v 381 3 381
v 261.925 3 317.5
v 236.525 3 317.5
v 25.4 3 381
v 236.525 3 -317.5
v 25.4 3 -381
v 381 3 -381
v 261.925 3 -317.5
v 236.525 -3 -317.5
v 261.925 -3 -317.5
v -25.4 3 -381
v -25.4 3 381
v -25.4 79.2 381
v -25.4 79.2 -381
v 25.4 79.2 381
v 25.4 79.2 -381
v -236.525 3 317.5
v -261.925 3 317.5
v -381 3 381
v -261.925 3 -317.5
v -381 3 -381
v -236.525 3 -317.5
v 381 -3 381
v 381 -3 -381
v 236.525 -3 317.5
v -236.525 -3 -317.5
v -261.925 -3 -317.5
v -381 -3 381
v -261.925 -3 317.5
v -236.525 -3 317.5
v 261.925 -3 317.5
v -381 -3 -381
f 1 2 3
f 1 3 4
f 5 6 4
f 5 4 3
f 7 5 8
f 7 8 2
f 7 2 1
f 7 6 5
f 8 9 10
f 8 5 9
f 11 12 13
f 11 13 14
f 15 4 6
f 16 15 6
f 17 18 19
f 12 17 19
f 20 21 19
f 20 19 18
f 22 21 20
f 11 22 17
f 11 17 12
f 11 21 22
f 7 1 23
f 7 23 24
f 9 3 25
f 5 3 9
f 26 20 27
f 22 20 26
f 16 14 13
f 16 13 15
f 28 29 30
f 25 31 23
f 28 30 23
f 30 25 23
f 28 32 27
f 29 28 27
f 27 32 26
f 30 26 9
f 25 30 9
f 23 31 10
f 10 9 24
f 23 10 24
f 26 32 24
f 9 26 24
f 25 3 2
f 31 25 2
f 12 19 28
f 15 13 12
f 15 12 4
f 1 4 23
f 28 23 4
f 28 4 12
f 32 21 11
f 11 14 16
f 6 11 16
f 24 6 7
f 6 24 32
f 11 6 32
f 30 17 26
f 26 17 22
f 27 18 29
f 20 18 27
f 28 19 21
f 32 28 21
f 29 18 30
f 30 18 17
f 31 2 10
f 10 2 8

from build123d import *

# Parameters (mm, degrees)
SKETCH1_W           = 762
SKETCH1_H           = 762
SKETCH1_W_2         = 25.4
SKETCH1_H_2         = 635
BOSS_EXTRUDE1_DEPTH = 3
SKETCH2_W           = 50.8
SKETCH2_H           = 762
BOSS_EXTRUDE2_DEPTH = 76.2


with BuildPart() as part:
    # Sketch1 → Boss-Extrude1 (new, symmetric)
    with BuildSketch(Plane(origin=(0, 0, 0), x_dir=(1, 0, 0), z_dir=(0, 1, 0))):
        Rectangle(SKETCH1_W, SKETCH1_H)
        with Locations((-249.2248, 0)):
            Rectangle(SKETCH1_W_2, SKETCH1_H_2, mode=Mode.SUBTRACT)
        with Locations((249.2248, 0)):
            Rectangle(SKETCH1_W_2, SKETCH1_H_2, mode=Mode.SUBTRACT)
    extrude(amount=BOSS_EXTRUDE1_DEPTH, both=True)

    # Sketch2 → Boss-Extrude2 (add)
    with BuildSketch(Plane(origin=(0, 3, 0), x_dir=(1, 0, 0), z_dir=(0, 1, 0))):
        Rectangle(SKETCH2_W, SKETCH2_H)
    extrude(amount=BOSS_EXTRUDE2_DEPTH)


solid = part.part
